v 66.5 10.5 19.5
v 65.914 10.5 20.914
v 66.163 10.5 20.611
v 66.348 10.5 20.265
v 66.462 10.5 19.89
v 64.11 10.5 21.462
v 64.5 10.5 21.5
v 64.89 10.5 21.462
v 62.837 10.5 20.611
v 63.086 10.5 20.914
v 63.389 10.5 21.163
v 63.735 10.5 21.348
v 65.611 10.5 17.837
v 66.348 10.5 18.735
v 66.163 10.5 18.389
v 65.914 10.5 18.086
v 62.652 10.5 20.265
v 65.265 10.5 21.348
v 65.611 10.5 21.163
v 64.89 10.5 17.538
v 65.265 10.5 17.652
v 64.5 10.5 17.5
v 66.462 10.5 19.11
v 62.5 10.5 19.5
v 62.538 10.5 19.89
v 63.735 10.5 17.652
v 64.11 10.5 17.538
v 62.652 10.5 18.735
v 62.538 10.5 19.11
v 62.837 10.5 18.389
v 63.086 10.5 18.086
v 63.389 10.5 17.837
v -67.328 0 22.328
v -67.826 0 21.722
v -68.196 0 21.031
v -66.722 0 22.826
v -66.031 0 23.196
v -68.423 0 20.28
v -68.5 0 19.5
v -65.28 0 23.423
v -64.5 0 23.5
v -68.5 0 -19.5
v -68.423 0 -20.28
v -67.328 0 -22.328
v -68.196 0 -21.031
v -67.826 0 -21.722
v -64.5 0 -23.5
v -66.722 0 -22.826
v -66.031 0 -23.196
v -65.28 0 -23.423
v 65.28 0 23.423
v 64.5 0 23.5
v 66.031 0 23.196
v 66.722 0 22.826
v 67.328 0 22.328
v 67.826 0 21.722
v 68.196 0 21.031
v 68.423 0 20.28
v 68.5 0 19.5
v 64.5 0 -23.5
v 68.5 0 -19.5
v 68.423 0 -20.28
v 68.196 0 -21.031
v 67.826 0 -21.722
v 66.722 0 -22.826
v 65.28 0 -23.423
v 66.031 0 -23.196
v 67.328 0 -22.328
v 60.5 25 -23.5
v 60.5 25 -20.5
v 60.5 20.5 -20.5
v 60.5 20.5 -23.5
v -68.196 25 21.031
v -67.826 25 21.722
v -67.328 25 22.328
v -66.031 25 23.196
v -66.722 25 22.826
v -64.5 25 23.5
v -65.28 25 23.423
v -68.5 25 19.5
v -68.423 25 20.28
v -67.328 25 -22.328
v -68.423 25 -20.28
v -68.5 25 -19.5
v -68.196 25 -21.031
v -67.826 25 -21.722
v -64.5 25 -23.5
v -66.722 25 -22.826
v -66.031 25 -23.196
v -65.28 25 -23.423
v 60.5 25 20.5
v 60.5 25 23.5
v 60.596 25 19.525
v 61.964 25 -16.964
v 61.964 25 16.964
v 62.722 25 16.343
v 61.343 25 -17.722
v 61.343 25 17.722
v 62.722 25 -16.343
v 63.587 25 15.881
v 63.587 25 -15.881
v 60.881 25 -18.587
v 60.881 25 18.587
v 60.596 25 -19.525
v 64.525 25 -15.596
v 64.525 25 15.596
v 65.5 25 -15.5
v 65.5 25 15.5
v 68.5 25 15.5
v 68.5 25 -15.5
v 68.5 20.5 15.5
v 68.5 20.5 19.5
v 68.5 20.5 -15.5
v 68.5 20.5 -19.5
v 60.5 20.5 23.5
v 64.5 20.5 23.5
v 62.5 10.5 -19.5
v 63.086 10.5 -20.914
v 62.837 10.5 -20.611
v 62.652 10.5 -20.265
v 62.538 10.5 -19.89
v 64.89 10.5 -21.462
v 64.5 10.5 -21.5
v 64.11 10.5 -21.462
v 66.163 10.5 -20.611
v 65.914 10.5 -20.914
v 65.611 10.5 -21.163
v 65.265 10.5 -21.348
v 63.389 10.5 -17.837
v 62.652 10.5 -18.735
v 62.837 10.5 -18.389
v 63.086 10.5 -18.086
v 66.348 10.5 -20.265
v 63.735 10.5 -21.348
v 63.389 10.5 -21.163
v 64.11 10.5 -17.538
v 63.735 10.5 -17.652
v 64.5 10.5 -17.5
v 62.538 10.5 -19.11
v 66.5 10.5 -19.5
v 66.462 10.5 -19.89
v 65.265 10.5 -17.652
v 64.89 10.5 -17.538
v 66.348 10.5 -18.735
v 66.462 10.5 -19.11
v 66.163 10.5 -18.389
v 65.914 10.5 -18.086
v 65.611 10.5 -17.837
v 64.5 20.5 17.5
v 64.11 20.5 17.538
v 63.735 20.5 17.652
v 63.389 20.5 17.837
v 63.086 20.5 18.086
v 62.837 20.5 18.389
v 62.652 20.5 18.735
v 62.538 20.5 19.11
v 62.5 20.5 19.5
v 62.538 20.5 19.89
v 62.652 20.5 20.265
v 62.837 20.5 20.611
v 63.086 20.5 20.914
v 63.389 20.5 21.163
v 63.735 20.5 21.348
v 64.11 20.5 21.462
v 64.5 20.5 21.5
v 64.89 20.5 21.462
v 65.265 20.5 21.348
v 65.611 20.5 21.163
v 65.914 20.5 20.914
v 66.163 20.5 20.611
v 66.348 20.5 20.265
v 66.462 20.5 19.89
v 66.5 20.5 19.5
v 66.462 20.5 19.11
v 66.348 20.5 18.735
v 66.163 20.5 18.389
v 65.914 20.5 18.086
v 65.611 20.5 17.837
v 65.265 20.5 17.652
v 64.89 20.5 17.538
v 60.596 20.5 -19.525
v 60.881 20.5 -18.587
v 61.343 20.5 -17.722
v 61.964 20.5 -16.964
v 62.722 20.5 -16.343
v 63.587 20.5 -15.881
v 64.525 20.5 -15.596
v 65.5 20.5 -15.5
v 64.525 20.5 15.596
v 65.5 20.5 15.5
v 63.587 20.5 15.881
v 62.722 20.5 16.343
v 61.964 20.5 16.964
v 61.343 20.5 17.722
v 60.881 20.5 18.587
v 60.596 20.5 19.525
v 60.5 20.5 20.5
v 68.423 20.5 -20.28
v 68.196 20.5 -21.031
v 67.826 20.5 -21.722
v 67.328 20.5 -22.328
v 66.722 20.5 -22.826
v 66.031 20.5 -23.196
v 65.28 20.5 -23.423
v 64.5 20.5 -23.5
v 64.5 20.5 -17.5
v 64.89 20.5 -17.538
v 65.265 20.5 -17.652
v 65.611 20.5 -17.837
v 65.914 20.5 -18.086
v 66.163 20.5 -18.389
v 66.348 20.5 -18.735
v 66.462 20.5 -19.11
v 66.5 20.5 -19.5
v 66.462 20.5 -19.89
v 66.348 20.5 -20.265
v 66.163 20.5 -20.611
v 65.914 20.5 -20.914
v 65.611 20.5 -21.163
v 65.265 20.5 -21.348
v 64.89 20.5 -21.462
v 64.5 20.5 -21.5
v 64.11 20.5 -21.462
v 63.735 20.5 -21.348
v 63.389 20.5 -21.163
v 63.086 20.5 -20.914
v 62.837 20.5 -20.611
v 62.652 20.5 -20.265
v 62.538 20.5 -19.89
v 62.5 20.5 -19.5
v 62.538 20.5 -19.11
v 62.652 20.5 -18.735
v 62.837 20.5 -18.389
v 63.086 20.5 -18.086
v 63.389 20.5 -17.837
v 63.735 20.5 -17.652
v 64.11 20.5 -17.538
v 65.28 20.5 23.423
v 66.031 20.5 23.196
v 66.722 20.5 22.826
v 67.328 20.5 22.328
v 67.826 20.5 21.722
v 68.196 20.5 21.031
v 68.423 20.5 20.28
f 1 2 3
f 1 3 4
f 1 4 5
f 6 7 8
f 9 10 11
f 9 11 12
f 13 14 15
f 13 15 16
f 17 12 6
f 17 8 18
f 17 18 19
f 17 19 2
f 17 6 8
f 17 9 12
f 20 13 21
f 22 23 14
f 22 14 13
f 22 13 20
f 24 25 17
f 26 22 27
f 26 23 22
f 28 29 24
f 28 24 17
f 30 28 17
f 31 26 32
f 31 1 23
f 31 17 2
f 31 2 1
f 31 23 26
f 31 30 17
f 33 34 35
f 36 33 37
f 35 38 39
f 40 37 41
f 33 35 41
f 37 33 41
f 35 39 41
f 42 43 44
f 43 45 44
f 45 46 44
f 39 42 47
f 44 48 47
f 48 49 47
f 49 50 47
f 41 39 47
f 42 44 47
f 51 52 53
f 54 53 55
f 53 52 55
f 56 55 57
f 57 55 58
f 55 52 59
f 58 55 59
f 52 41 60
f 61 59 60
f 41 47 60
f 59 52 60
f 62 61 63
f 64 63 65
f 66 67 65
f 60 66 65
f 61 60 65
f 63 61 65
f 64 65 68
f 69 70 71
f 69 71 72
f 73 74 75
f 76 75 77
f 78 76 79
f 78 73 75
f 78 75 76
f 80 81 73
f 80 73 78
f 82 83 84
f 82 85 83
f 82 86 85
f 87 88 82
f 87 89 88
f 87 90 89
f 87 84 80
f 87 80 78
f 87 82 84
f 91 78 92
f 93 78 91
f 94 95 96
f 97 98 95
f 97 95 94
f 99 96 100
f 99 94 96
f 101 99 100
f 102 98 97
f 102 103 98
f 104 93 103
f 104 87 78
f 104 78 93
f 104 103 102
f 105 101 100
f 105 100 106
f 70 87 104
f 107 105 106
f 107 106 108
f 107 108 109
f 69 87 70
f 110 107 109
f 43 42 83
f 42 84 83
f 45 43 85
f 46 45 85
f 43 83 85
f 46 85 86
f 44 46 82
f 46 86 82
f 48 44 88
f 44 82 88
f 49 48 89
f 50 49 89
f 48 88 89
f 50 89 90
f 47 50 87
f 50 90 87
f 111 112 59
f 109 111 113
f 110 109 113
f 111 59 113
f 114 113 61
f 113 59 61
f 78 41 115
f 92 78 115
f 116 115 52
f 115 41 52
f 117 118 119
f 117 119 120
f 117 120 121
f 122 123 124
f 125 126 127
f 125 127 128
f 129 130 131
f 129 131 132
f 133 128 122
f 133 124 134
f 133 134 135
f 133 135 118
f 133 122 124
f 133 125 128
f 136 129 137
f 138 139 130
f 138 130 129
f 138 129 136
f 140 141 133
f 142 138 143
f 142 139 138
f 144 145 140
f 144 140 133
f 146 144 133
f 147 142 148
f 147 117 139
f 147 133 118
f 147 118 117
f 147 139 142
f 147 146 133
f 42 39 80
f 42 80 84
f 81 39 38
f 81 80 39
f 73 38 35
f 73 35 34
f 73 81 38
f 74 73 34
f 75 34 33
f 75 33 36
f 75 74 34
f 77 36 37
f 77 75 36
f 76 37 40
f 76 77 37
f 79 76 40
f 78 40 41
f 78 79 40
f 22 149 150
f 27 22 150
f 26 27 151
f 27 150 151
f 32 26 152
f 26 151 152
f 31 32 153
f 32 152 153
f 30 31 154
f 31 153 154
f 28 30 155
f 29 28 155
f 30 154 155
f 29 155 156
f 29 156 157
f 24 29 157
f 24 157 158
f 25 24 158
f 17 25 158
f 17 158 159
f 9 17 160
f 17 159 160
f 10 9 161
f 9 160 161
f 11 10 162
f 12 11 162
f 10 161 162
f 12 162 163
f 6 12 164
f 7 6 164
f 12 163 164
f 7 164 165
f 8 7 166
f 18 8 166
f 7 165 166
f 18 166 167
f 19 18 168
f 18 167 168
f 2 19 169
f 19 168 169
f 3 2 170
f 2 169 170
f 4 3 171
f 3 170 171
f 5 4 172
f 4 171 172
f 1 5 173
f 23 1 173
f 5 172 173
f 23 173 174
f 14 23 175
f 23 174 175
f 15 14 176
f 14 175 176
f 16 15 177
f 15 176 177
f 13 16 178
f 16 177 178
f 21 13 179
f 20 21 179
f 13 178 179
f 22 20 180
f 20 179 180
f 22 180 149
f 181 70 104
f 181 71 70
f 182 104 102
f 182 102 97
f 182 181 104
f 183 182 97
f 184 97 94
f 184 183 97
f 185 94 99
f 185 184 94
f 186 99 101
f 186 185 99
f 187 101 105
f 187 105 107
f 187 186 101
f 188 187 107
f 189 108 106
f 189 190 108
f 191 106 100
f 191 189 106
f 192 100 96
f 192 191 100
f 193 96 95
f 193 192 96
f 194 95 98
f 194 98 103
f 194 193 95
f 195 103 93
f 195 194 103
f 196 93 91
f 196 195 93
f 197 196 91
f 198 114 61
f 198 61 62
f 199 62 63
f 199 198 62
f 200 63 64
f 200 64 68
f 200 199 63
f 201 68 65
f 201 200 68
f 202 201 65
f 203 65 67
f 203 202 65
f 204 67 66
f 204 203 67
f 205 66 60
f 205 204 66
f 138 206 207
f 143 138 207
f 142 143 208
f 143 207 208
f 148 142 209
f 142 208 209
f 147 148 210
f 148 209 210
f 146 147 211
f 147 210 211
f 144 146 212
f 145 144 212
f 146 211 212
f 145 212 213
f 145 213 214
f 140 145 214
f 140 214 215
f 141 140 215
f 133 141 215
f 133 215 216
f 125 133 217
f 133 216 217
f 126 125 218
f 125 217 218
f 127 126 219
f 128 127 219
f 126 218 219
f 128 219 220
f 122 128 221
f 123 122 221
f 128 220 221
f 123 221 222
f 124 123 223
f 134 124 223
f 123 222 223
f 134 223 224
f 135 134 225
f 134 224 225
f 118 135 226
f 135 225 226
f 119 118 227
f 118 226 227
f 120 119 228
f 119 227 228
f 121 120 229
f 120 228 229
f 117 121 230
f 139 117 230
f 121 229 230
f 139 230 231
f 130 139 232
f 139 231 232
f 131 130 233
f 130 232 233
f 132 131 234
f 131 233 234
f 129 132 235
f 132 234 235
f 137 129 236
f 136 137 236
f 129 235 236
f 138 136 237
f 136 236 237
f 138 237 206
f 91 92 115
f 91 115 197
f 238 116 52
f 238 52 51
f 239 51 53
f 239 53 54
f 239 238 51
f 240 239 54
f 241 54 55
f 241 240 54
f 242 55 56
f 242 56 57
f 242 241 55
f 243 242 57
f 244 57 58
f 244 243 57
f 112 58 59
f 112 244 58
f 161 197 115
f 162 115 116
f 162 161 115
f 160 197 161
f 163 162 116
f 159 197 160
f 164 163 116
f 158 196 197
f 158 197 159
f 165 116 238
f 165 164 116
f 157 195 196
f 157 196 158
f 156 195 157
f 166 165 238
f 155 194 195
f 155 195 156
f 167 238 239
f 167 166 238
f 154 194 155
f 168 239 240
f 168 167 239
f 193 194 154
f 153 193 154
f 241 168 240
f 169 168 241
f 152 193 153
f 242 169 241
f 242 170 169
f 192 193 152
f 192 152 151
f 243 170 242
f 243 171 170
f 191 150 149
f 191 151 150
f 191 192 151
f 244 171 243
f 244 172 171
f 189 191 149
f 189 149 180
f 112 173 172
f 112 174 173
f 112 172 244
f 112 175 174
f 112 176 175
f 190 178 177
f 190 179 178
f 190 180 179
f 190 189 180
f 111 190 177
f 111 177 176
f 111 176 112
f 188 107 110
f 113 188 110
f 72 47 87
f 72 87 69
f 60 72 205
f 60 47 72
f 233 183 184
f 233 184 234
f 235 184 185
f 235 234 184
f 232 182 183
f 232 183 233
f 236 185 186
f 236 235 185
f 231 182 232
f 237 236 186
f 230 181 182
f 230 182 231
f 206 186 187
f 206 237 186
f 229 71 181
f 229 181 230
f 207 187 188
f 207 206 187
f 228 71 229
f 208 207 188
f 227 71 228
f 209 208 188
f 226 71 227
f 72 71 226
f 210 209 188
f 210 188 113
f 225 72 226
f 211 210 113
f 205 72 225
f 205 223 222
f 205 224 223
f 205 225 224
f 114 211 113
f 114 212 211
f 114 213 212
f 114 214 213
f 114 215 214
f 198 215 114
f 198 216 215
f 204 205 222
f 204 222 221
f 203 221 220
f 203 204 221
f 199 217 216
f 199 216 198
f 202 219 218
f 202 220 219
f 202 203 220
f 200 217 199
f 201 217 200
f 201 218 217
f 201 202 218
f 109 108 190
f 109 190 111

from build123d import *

# Parameters (mm, degrees)
SKETCH1_W           = 137
SKETCH1_H           = 47
BOSS_EXTRUDE1_DEPTH = 25
FILLET1_R           = 4
SKETCH2_W           = 8
SKETCH2_H           = 8
CUT_EXTRUDE1_DEPTH  = 4.5
FILLET2_R           = 5
SKETCH3_R           = 2
CUT_EXTRUDE2_DEPTH  = 10


with BuildPart() as part:
    # Sketch1 → Boss-Extrude1 (new body)
    with BuildSketch(Plane(origin=(0, 0, 0), x_dir=(1, 0, 0), z_dir=(0, 1, 0))):
        Rectangle(SKETCH1_W, SKETCH1_H)
    extrude(amount=BOSS_EXTRUDE1_DEPTH)

    # Fillet1
    fillet1_edges = [part.edges().sort_by_distance(p)[0] for p in [
        (-68.5, 12.5, 23.5),
        (68.5, 12.5, 23.5),
        (68.5, 12.5, -23.5),
        (-68.5, 12.5, -23.5),
    ]]
    fillet(fillet1_edges, radius=FILLET1_R)

    # Sketch2 → Cut-Extrude1 (cut)
    with BuildSketch(Plane(origin=(0, 25, 0), x_dir=(1, 0, 0), z_dir=(0, 1, 0))):
        with Locations((64.5, 19.5)):
            Rectangle(SKETCH2_W, SKETCH2_H)
        with Locations((64.5, -19.5)):
            Rectangle(SKETCH2_W, SKETCH2_H)
    extrude(amount=-CUT_EXTRUDE1_DEPTH, mode=Mode.SUBTRACT)

    # Fillet2
    fillet2_edges = [part.edges().sort_by_distance(p)[0] for p in [
        (60.5, 22.75, -15.5),
        (60.5, 22.75, 15.5),
    ]]
    fillet(fillet2_edges, radius=FILLET2_R)

    # Sketch3 → Cut-Extrude2 (cut)
    with BuildSketch(Plane(origin=(0, 20.5, 0), x_dir=(1, 0, 0), z_dir=(0, 1, 0))):
        with Locations(Location((64.5, 19.5, 0), (0, 0, 270))):
            Circle(SKETCH3_R)
        with Locations(Location((64.5, -19.5, 0), (0, 0, 90))):
            Circle(SKETCH3_R)
    extrude(amount=-CUT_EXTRUDE2_DEPTH, mode=Mode.SUBTRACT)


solid = part.part
